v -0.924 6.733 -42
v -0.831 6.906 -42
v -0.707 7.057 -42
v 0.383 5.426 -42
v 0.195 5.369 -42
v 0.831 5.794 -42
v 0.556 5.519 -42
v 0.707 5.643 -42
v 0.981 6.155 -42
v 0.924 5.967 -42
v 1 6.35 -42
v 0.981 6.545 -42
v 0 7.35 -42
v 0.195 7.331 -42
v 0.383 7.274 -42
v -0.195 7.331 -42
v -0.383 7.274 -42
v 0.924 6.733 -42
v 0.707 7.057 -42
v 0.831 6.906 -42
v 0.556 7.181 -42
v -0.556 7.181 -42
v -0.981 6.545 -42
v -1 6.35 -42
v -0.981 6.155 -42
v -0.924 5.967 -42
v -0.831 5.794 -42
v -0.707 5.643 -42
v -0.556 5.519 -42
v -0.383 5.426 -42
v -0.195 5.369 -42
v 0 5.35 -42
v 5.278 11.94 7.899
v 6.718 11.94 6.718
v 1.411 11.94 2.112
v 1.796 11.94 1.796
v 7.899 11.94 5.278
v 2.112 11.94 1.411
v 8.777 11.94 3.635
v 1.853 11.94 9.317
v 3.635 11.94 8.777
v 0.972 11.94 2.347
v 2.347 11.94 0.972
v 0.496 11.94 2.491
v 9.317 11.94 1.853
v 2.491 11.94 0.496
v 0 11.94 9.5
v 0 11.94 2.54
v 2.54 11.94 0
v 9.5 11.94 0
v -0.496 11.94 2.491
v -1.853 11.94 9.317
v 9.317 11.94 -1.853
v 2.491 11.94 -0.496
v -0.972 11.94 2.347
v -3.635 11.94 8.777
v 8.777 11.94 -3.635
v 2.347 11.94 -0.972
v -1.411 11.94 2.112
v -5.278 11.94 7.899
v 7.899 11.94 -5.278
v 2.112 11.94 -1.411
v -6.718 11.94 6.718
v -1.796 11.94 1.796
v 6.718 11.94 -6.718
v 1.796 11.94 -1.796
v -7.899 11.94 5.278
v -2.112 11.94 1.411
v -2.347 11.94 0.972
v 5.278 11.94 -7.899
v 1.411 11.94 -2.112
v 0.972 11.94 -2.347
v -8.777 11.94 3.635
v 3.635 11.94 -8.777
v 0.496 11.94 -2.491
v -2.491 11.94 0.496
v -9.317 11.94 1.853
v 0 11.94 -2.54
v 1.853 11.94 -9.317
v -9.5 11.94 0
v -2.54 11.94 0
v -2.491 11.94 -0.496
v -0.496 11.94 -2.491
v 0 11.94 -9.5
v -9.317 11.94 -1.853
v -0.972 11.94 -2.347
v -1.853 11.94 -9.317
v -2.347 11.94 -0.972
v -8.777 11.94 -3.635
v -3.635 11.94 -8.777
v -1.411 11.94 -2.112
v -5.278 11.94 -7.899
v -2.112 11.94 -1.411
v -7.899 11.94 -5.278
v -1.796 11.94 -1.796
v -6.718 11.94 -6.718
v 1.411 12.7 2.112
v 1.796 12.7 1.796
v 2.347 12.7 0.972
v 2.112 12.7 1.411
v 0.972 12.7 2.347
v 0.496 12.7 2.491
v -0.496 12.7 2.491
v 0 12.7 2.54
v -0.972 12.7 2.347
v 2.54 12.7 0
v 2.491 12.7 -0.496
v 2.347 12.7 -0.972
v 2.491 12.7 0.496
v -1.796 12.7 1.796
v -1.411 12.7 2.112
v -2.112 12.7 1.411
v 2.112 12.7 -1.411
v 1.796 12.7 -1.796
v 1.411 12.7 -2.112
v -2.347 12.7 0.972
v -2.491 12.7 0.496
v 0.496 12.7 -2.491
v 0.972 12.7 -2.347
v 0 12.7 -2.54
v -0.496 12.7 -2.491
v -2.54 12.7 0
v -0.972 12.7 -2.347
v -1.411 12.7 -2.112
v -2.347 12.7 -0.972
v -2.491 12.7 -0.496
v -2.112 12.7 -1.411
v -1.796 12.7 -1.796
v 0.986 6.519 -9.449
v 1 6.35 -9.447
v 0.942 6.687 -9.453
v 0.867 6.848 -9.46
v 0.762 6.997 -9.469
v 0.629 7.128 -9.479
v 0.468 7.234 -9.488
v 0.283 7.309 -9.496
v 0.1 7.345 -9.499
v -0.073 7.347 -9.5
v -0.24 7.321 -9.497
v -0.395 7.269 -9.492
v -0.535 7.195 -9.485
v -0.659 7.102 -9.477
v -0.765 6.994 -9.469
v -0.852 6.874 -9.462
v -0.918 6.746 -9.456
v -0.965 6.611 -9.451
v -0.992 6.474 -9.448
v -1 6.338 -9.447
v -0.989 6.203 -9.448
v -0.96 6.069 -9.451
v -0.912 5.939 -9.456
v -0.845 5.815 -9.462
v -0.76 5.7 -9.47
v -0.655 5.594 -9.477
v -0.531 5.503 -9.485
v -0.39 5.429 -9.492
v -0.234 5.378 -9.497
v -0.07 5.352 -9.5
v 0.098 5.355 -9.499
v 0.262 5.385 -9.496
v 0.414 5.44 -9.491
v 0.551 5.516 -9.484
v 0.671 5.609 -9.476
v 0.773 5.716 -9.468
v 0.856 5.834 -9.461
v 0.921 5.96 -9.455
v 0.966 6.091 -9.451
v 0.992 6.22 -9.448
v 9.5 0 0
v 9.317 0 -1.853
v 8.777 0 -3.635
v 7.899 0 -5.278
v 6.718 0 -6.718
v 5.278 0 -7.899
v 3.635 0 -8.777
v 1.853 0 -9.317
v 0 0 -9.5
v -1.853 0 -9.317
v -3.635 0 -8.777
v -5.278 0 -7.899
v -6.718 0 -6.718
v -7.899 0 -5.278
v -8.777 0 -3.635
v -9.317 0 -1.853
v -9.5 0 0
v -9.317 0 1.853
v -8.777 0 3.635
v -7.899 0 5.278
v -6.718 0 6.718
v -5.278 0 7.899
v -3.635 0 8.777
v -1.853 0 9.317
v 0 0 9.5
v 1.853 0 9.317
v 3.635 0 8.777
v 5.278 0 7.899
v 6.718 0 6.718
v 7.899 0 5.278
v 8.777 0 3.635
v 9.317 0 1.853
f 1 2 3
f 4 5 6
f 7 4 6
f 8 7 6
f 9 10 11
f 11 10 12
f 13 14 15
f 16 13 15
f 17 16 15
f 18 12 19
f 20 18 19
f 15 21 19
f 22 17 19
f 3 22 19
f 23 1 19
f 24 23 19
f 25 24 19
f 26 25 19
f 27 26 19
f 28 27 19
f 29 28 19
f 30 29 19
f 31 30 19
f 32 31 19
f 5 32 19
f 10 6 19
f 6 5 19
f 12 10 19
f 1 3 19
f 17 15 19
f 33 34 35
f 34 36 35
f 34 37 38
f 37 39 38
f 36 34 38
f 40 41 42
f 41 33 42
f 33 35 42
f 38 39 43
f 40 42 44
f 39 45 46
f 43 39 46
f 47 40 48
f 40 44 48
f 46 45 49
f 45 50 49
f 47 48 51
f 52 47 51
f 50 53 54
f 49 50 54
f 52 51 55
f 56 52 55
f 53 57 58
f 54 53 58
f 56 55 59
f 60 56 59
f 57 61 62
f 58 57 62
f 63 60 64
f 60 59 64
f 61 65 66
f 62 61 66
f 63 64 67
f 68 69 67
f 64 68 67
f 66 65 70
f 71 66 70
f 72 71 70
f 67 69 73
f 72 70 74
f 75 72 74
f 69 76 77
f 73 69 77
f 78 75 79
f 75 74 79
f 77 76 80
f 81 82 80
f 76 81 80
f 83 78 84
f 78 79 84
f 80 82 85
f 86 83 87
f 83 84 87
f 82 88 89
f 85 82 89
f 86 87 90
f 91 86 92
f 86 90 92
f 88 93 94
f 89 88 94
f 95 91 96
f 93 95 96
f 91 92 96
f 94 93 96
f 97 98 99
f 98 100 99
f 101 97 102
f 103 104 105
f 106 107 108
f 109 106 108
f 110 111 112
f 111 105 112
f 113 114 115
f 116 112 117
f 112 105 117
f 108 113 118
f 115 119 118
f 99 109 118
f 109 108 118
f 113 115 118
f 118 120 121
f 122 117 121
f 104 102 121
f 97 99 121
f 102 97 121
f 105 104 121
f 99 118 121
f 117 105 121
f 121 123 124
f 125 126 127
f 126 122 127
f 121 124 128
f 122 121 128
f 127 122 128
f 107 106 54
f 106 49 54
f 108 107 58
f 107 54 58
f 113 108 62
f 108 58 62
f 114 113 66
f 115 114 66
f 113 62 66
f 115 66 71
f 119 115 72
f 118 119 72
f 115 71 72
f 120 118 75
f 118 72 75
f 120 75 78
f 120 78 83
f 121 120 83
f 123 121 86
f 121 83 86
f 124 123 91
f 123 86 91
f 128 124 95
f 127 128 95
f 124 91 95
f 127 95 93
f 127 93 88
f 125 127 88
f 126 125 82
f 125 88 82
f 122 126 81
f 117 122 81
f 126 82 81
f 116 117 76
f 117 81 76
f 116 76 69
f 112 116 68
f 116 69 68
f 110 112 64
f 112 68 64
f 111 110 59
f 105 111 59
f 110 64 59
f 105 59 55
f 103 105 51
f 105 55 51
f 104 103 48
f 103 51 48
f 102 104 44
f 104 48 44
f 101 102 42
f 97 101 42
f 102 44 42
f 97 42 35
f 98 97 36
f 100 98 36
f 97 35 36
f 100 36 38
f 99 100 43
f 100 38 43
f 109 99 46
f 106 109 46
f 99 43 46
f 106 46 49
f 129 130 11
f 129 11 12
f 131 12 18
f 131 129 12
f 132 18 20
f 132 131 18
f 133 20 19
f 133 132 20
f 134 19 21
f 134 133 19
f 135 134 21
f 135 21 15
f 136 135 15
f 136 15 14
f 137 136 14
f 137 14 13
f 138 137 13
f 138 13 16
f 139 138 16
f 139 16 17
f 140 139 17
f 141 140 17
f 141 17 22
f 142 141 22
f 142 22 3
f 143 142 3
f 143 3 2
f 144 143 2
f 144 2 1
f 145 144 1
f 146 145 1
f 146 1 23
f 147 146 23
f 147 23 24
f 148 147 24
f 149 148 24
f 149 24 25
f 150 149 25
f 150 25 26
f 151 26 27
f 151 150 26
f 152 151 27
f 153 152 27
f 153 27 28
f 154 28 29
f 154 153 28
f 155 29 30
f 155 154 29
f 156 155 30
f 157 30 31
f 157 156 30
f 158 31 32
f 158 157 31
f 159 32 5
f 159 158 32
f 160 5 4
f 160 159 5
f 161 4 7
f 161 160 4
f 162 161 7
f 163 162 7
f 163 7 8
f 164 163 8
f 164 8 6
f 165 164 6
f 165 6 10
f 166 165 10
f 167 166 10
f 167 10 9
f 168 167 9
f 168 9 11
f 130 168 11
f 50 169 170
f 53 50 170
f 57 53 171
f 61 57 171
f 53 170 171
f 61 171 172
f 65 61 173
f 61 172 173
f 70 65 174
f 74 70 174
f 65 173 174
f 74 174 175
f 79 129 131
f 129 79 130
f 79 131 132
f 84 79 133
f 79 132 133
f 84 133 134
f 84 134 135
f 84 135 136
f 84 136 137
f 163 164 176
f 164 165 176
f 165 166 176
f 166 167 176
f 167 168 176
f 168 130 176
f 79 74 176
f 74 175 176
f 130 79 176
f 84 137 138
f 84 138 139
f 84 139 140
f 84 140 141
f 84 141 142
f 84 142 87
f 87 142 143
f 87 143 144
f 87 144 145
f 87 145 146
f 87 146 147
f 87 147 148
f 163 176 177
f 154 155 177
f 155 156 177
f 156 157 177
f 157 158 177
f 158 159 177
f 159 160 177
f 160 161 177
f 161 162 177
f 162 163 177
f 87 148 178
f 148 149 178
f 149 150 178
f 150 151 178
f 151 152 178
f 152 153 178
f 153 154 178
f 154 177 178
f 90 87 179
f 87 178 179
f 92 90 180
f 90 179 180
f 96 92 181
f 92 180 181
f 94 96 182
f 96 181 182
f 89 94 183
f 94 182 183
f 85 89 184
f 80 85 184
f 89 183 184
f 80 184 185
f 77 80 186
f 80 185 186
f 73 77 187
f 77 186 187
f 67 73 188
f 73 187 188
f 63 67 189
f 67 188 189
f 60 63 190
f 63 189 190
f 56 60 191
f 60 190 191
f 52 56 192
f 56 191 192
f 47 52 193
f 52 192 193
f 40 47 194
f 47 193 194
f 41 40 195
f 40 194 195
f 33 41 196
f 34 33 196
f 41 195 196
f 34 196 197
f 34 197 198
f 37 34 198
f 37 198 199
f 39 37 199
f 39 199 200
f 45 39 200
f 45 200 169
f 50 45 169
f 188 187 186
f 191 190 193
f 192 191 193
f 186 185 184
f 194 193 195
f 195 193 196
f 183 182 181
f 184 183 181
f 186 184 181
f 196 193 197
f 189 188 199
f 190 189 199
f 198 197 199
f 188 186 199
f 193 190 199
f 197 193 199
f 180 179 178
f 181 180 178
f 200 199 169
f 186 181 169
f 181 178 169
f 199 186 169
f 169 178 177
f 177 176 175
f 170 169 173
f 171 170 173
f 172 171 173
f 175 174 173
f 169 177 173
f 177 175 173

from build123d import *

# Parameters (mm, degrees)
SKETCH3_R           = 1
BOSS_EXTRUDE1_DEPTH = 42


with BuildPart() as part:
    # Sketch2 → Revolve1 (revolve)
    with BuildSketch(Plane.XY):
        Polygon((0, 0), (0, 12.7), (2.54, 12.7), (2.54, 11.94), (9.5, 11.94), (9.5, 0), align=None)
    revolve(axis=Axis((0, 0, 0), (0, 1, 0)))

    # Sketch3 → Boss-Extrude1 (add)
    with BuildSketch(Plane.XY):
        with Locations((0, 6.35)):
            Circle(SKETCH3_R)
    extrude(amount=-BOSS_EXTRUDE1_DEPTH)


solid = part.part
